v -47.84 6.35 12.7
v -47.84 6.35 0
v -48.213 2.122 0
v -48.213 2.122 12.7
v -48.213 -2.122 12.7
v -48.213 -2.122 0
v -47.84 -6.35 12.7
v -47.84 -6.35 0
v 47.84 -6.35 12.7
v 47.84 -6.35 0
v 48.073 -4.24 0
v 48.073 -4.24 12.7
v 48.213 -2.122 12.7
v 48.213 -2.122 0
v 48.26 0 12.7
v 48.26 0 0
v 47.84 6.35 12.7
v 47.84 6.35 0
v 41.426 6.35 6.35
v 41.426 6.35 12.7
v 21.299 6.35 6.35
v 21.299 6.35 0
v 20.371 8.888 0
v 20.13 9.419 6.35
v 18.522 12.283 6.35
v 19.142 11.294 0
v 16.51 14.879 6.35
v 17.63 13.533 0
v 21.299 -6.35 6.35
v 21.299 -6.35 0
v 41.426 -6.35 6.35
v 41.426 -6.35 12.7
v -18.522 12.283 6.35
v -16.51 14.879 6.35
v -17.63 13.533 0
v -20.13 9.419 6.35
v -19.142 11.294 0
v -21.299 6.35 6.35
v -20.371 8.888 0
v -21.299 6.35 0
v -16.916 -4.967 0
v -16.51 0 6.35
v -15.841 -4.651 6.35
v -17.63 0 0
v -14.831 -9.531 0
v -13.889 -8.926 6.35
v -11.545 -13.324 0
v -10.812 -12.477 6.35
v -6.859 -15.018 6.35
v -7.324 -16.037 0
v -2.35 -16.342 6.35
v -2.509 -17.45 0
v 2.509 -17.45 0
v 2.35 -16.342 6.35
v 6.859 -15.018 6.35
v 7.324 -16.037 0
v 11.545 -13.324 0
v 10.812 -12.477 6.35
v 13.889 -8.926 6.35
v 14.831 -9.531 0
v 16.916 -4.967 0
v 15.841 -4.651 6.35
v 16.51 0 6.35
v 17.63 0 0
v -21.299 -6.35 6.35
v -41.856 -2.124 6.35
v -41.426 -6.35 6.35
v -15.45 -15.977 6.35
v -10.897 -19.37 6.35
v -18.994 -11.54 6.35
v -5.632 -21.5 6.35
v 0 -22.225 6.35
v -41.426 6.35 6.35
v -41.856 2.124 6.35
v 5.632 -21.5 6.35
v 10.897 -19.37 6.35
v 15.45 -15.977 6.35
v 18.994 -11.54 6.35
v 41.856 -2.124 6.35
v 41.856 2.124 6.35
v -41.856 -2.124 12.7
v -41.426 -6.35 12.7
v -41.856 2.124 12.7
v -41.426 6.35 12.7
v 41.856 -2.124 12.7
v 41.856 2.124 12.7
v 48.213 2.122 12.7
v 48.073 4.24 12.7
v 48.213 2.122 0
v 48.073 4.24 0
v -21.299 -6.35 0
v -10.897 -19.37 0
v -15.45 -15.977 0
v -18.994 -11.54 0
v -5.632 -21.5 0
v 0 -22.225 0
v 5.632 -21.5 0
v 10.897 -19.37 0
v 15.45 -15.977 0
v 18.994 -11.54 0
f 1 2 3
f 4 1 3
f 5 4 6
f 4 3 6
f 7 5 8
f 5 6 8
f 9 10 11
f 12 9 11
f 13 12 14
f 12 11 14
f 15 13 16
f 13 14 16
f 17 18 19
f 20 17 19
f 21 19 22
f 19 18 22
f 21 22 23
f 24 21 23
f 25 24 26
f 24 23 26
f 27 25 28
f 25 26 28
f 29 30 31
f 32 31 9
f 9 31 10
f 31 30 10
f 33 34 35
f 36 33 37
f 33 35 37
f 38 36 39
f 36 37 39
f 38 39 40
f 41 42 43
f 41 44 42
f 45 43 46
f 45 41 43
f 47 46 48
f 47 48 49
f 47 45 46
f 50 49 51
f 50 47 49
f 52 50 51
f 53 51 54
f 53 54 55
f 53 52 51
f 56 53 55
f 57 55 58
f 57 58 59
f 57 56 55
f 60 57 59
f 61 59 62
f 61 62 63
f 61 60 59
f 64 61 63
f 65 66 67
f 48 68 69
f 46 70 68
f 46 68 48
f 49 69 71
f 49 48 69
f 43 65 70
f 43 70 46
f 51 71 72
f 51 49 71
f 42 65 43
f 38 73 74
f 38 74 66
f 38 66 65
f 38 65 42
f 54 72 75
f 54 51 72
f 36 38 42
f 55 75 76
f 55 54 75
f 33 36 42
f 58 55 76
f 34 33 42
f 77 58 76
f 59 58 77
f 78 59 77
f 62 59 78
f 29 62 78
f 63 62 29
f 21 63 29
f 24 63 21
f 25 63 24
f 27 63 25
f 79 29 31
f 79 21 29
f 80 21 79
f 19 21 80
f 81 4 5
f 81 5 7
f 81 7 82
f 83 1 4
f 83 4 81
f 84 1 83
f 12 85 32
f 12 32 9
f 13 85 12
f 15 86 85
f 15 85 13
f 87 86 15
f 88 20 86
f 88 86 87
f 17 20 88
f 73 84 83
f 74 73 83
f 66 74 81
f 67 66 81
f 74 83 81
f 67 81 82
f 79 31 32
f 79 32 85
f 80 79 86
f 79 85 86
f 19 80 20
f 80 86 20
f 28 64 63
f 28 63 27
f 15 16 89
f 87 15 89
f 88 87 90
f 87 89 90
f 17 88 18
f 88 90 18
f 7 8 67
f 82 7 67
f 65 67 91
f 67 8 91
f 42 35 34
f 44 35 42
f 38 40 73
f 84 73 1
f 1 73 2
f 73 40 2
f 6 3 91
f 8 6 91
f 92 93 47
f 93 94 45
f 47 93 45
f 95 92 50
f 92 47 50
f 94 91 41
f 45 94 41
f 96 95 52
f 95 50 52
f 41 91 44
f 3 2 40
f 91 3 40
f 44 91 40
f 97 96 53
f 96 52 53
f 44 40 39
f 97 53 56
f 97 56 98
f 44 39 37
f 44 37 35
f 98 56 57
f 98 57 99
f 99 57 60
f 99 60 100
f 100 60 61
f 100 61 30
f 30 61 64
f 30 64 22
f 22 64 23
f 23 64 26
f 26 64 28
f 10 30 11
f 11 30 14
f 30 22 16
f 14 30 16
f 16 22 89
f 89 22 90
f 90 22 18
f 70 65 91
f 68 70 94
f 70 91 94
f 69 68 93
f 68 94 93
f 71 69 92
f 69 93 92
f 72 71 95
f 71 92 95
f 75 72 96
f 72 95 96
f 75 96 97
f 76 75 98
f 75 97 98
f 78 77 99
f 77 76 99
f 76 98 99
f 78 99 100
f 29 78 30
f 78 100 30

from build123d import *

# Parameters (mm, degrees)
F1_DEPTH = 12.7
F2_R     = 41.91
F3_DEPTH = 6.35
F5_DEPTH = 6.35
F5_TAPER = -10


with BuildPart() as f1:
    # F0 (on Top) → F1 (new body)
    with BuildSketch(Plane.XY):
        with BuildLine():
            Line((-21.2985474857, 6.35), (-47.8404128327, 6.35))
            ThreePointArc((-47.8404128327, 6.35), (-48.26, 0), (-47.8404128327, -6.35))
            Line((-47.8404128327, -6.35), (-21.2985474857, -6.35))
            ThreePointArc((-21.2985474857, -6.35), (-22.225, 0), (-21.2985474857, 6.35))
        make_face()
        with BuildLine():
            ThreePointArc((22.225, 0), (21.9921672746, 3.2086139633), (21.2985474857, 6.35))
            Line((21.2985474857, 6.35), (-21.2985474857, 6.35))
            ThreePointArc((-21.2985474857, 6.35), (-22.225, 0), (-21.2985474857, -6.35))
            Line((-21.2985474857, -6.35), (21.2985474857, -6.35))
            ThreePointArc((21.2985474857, -6.35), (21.9921672746, -3.2086139633), (22.225, 0))
        make_face()
        with BuildLine():
            ThreePointArc((47.8404128327, -6.35), (48.1549889591, -3.1819236867), (48.26, 0))
            ThreePointArc((48.26, 0), (48.1549889591, 3.1819236867), (47.8404128327, 6.35))
            Line((47.8404128327, 6.35), (21.2985474857, 6.35))
            ThreePointArc((21.2985474857, 6.35), (21.9921672746, 3.2086139633), (22.225, 0))
            ThreePointArc((22.225, 0), (21.9921672746, -3.2086139633), (21.2985474857, -6.35))
            Line((21.2985474857, -6.35), (47.8404128327, -6.35))
        make_face()
        with BuildLine():
            ThreePointArc((-21.2985474857, -6.35), (0, -22.225), (21.2985474857, -6.35))
            Line((21.2985474857, -6.35), (-21.2985474857, -6.35))
        make_face()
        with BuildLine():
            Line((-21.2985474857, 6.35), (21.2985474857, 6.35))
            ThreePointArc((21.2985474857, 6.35), (0, 22.225), (-21.2985474857, 6.35))
        make_face()
    extrude(amount=F1_DEPTH)

    # F2 (on face) → F3 (cut)
    with BuildSketch(Plane.XY.offset(12.7)):
        Circle(F2_R)
    extrude(amount=-F3_DEPTH, mode=Mode.SUBTRACT)

    # F4 (on face) → F5 (cut, through all)
    with BuildSketch(Plane.XY.offset(6.35)):
        with BuildLine():
            ThreePointArc((-16.51, 0), (0, 16.51), (16.51, 0))
            Line((16.51, 0), (16.51, 14.8785256326))
            ThreePointArc((16.51, 14.8785256326), (0, 22.225), (-16.51, 14.8785256326))
            Line((-16.51, 14.8785256326), (-16.51, 0))
        make_face()
        with BuildLine():
            ThreePointArc((-16.51, 0), (0, -16.51), (16.51, 0))
            ThreePointArc((16.51, 0), (0, 16.51), (-16.51, 0))
        make_face()
    extrude(amount=-F5_DEPTH, taper=F5_TAPER, mode=Mode.SUBTRACT)


solid = f1.part
